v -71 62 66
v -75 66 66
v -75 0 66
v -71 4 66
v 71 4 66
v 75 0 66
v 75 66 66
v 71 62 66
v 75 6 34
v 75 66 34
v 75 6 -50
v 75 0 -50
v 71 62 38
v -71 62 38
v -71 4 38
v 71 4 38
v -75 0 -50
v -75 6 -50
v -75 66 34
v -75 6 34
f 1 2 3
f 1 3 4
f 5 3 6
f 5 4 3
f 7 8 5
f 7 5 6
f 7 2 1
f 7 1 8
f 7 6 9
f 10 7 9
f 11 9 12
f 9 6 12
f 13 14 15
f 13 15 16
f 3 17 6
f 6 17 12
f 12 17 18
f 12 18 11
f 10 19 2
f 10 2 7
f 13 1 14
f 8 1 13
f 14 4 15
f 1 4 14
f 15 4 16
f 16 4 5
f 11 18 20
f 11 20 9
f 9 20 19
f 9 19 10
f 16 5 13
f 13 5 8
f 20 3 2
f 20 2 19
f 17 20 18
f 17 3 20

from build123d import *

# Parameters (mm, degrees)
SKETCH1_W           = 150
SKETCH1_H           = 112
BOSS_EXTRUDE1_DEPTH = 6
SKETCH3_W           = 150
SKETCH3_H           = 6
BOSS_EXTRUDE2_DEPTH = 8
SKETCH4_W           = 150
SKETCH4_H           = 4
BOSS_EXTRUDE3_DEPTH = 8
SKETCH6_W           = 150
SKETCH6_H           = 36
BOSS_EXTRUDE4_DEPTH = 60
CUT_EXTRUDE1_START  = -4
SKETCH7_W           = 150
SKETCH7_H           = 74
CUT_EXTRUDE1_DEPTH  = 4
SKETCH8_W           = 142
SKETCH8_H           = 58
CUT_EXTRUDE2_DEPTH  = 28


with BuildPart() as part:
    # Sketch1 → Boss-Extrude1 (new body)
    with BuildSketch(Plane(origin=(0, 0, 0), x_dir=(1, 0, 0), z_dir=(0, 1, 0))):
        with Locations((0, -6)):
            Rectangle(SKETCH1_W, SKETCH1_H)
    extrude(amount=BOSS_EXTRUDE1_DEPTH)

    # Sketch3 → Boss-Extrude2 (add)
    with BuildSketch(Plane.XY.offset(62)):
        with Locations((0, 3)):
            Rectangle(SKETCH3_W, SKETCH3_H)
    extrude(amount=BOSS_EXTRUDE2_DEPTH)

    # Sketch4 → Boss-Extrude3 (add)
    with BuildSketch(Plane(origin=(0, 0, 0), x_dir=(-1, 0, 0), z_dir=(0, -1, 0))):
        with Locations((0, -68)):
            Rectangle(SKETCH4_W, SKETCH4_H)
    extrude(amount=BOSS_EXTRUDE3_DEPTH)

    # Sketch6 → Boss-Extrude4 (add)
    with BuildSketch(Plane(origin=(0, 6, 0), x_dir=(1, 0, 0), z_dir=(0, 1, 0))):
        with Locations((0, -52)):
            Rectangle(SKETCH6_W, SKETCH6_H)
    extrude(amount=BOSS_EXTRUDE4_DEPTH)

    # Sketch7 → Cut-Extrude1 (cut)
    with BuildSketch(Plane.XY.offset(70).offset(CUT_EXTRUDE1_START)):
        with Locations((0, 29)):
            Rectangle(SKETCH7_W, SKETCH7_H)
    extrude(amount=CUT_EXTRUDE1_DEPTH, mode=Mode.SUBTRACT)

    # Sketch8 → Cut-Extrude2 (cut)
    with BuildSketch(Plane.XY.offset(66)):
        with Locations((0, 33)):
            Rectangle(SKETCH8_W, SKETCH8_H)
    extrude(amount=-CUT_EXTRUDE2_DEPTH, mode=Mode.SUBTRACT)


solid = part.part
